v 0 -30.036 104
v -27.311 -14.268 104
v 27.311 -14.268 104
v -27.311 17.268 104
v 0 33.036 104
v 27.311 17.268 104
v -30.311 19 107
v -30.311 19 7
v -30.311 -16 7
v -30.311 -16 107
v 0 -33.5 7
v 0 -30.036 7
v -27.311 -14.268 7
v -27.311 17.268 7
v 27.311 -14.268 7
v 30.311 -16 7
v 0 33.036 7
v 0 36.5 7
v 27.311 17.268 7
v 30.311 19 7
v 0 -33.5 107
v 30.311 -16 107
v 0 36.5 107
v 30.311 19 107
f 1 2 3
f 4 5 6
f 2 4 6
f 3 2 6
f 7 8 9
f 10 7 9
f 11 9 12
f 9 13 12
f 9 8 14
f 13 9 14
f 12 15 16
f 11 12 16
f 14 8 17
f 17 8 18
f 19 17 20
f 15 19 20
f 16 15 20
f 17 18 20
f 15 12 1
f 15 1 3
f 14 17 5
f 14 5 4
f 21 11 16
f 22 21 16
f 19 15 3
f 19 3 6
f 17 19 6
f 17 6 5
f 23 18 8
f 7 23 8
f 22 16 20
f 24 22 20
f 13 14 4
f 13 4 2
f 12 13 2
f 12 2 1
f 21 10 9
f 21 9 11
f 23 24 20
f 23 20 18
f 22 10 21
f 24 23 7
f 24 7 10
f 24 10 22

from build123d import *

# Parameters (mm, degrees)
PAD003_DEPTH   = 100
THICKNESS001_T = -3


with BuildPart() as part:
    # Sketch004 → Pad003 (new body)
    with BuildSketch(Plane.XY):
        Polygon((0, -35), (30.310889, -17.5), (30.310889, 17.5), (0, 35), (-30.310889, 17.5), (-30.310889, -17.5), align=None)
    extrude(amount=PAD003_DEPTH)

    # Thickness001
    thickness001_openings = [part.faces().sort_by_distance(p)[0] for p in [
        (0, 0, 0),
    ]]
    offset(amount=THICKNESS001_T, openings=thickness001_openings)


with BuildPart() as part_1:
    # Body001 placement: moved
    add(part.part.moved(Location((0, 1.5, 7))))


solid = part_1.part
